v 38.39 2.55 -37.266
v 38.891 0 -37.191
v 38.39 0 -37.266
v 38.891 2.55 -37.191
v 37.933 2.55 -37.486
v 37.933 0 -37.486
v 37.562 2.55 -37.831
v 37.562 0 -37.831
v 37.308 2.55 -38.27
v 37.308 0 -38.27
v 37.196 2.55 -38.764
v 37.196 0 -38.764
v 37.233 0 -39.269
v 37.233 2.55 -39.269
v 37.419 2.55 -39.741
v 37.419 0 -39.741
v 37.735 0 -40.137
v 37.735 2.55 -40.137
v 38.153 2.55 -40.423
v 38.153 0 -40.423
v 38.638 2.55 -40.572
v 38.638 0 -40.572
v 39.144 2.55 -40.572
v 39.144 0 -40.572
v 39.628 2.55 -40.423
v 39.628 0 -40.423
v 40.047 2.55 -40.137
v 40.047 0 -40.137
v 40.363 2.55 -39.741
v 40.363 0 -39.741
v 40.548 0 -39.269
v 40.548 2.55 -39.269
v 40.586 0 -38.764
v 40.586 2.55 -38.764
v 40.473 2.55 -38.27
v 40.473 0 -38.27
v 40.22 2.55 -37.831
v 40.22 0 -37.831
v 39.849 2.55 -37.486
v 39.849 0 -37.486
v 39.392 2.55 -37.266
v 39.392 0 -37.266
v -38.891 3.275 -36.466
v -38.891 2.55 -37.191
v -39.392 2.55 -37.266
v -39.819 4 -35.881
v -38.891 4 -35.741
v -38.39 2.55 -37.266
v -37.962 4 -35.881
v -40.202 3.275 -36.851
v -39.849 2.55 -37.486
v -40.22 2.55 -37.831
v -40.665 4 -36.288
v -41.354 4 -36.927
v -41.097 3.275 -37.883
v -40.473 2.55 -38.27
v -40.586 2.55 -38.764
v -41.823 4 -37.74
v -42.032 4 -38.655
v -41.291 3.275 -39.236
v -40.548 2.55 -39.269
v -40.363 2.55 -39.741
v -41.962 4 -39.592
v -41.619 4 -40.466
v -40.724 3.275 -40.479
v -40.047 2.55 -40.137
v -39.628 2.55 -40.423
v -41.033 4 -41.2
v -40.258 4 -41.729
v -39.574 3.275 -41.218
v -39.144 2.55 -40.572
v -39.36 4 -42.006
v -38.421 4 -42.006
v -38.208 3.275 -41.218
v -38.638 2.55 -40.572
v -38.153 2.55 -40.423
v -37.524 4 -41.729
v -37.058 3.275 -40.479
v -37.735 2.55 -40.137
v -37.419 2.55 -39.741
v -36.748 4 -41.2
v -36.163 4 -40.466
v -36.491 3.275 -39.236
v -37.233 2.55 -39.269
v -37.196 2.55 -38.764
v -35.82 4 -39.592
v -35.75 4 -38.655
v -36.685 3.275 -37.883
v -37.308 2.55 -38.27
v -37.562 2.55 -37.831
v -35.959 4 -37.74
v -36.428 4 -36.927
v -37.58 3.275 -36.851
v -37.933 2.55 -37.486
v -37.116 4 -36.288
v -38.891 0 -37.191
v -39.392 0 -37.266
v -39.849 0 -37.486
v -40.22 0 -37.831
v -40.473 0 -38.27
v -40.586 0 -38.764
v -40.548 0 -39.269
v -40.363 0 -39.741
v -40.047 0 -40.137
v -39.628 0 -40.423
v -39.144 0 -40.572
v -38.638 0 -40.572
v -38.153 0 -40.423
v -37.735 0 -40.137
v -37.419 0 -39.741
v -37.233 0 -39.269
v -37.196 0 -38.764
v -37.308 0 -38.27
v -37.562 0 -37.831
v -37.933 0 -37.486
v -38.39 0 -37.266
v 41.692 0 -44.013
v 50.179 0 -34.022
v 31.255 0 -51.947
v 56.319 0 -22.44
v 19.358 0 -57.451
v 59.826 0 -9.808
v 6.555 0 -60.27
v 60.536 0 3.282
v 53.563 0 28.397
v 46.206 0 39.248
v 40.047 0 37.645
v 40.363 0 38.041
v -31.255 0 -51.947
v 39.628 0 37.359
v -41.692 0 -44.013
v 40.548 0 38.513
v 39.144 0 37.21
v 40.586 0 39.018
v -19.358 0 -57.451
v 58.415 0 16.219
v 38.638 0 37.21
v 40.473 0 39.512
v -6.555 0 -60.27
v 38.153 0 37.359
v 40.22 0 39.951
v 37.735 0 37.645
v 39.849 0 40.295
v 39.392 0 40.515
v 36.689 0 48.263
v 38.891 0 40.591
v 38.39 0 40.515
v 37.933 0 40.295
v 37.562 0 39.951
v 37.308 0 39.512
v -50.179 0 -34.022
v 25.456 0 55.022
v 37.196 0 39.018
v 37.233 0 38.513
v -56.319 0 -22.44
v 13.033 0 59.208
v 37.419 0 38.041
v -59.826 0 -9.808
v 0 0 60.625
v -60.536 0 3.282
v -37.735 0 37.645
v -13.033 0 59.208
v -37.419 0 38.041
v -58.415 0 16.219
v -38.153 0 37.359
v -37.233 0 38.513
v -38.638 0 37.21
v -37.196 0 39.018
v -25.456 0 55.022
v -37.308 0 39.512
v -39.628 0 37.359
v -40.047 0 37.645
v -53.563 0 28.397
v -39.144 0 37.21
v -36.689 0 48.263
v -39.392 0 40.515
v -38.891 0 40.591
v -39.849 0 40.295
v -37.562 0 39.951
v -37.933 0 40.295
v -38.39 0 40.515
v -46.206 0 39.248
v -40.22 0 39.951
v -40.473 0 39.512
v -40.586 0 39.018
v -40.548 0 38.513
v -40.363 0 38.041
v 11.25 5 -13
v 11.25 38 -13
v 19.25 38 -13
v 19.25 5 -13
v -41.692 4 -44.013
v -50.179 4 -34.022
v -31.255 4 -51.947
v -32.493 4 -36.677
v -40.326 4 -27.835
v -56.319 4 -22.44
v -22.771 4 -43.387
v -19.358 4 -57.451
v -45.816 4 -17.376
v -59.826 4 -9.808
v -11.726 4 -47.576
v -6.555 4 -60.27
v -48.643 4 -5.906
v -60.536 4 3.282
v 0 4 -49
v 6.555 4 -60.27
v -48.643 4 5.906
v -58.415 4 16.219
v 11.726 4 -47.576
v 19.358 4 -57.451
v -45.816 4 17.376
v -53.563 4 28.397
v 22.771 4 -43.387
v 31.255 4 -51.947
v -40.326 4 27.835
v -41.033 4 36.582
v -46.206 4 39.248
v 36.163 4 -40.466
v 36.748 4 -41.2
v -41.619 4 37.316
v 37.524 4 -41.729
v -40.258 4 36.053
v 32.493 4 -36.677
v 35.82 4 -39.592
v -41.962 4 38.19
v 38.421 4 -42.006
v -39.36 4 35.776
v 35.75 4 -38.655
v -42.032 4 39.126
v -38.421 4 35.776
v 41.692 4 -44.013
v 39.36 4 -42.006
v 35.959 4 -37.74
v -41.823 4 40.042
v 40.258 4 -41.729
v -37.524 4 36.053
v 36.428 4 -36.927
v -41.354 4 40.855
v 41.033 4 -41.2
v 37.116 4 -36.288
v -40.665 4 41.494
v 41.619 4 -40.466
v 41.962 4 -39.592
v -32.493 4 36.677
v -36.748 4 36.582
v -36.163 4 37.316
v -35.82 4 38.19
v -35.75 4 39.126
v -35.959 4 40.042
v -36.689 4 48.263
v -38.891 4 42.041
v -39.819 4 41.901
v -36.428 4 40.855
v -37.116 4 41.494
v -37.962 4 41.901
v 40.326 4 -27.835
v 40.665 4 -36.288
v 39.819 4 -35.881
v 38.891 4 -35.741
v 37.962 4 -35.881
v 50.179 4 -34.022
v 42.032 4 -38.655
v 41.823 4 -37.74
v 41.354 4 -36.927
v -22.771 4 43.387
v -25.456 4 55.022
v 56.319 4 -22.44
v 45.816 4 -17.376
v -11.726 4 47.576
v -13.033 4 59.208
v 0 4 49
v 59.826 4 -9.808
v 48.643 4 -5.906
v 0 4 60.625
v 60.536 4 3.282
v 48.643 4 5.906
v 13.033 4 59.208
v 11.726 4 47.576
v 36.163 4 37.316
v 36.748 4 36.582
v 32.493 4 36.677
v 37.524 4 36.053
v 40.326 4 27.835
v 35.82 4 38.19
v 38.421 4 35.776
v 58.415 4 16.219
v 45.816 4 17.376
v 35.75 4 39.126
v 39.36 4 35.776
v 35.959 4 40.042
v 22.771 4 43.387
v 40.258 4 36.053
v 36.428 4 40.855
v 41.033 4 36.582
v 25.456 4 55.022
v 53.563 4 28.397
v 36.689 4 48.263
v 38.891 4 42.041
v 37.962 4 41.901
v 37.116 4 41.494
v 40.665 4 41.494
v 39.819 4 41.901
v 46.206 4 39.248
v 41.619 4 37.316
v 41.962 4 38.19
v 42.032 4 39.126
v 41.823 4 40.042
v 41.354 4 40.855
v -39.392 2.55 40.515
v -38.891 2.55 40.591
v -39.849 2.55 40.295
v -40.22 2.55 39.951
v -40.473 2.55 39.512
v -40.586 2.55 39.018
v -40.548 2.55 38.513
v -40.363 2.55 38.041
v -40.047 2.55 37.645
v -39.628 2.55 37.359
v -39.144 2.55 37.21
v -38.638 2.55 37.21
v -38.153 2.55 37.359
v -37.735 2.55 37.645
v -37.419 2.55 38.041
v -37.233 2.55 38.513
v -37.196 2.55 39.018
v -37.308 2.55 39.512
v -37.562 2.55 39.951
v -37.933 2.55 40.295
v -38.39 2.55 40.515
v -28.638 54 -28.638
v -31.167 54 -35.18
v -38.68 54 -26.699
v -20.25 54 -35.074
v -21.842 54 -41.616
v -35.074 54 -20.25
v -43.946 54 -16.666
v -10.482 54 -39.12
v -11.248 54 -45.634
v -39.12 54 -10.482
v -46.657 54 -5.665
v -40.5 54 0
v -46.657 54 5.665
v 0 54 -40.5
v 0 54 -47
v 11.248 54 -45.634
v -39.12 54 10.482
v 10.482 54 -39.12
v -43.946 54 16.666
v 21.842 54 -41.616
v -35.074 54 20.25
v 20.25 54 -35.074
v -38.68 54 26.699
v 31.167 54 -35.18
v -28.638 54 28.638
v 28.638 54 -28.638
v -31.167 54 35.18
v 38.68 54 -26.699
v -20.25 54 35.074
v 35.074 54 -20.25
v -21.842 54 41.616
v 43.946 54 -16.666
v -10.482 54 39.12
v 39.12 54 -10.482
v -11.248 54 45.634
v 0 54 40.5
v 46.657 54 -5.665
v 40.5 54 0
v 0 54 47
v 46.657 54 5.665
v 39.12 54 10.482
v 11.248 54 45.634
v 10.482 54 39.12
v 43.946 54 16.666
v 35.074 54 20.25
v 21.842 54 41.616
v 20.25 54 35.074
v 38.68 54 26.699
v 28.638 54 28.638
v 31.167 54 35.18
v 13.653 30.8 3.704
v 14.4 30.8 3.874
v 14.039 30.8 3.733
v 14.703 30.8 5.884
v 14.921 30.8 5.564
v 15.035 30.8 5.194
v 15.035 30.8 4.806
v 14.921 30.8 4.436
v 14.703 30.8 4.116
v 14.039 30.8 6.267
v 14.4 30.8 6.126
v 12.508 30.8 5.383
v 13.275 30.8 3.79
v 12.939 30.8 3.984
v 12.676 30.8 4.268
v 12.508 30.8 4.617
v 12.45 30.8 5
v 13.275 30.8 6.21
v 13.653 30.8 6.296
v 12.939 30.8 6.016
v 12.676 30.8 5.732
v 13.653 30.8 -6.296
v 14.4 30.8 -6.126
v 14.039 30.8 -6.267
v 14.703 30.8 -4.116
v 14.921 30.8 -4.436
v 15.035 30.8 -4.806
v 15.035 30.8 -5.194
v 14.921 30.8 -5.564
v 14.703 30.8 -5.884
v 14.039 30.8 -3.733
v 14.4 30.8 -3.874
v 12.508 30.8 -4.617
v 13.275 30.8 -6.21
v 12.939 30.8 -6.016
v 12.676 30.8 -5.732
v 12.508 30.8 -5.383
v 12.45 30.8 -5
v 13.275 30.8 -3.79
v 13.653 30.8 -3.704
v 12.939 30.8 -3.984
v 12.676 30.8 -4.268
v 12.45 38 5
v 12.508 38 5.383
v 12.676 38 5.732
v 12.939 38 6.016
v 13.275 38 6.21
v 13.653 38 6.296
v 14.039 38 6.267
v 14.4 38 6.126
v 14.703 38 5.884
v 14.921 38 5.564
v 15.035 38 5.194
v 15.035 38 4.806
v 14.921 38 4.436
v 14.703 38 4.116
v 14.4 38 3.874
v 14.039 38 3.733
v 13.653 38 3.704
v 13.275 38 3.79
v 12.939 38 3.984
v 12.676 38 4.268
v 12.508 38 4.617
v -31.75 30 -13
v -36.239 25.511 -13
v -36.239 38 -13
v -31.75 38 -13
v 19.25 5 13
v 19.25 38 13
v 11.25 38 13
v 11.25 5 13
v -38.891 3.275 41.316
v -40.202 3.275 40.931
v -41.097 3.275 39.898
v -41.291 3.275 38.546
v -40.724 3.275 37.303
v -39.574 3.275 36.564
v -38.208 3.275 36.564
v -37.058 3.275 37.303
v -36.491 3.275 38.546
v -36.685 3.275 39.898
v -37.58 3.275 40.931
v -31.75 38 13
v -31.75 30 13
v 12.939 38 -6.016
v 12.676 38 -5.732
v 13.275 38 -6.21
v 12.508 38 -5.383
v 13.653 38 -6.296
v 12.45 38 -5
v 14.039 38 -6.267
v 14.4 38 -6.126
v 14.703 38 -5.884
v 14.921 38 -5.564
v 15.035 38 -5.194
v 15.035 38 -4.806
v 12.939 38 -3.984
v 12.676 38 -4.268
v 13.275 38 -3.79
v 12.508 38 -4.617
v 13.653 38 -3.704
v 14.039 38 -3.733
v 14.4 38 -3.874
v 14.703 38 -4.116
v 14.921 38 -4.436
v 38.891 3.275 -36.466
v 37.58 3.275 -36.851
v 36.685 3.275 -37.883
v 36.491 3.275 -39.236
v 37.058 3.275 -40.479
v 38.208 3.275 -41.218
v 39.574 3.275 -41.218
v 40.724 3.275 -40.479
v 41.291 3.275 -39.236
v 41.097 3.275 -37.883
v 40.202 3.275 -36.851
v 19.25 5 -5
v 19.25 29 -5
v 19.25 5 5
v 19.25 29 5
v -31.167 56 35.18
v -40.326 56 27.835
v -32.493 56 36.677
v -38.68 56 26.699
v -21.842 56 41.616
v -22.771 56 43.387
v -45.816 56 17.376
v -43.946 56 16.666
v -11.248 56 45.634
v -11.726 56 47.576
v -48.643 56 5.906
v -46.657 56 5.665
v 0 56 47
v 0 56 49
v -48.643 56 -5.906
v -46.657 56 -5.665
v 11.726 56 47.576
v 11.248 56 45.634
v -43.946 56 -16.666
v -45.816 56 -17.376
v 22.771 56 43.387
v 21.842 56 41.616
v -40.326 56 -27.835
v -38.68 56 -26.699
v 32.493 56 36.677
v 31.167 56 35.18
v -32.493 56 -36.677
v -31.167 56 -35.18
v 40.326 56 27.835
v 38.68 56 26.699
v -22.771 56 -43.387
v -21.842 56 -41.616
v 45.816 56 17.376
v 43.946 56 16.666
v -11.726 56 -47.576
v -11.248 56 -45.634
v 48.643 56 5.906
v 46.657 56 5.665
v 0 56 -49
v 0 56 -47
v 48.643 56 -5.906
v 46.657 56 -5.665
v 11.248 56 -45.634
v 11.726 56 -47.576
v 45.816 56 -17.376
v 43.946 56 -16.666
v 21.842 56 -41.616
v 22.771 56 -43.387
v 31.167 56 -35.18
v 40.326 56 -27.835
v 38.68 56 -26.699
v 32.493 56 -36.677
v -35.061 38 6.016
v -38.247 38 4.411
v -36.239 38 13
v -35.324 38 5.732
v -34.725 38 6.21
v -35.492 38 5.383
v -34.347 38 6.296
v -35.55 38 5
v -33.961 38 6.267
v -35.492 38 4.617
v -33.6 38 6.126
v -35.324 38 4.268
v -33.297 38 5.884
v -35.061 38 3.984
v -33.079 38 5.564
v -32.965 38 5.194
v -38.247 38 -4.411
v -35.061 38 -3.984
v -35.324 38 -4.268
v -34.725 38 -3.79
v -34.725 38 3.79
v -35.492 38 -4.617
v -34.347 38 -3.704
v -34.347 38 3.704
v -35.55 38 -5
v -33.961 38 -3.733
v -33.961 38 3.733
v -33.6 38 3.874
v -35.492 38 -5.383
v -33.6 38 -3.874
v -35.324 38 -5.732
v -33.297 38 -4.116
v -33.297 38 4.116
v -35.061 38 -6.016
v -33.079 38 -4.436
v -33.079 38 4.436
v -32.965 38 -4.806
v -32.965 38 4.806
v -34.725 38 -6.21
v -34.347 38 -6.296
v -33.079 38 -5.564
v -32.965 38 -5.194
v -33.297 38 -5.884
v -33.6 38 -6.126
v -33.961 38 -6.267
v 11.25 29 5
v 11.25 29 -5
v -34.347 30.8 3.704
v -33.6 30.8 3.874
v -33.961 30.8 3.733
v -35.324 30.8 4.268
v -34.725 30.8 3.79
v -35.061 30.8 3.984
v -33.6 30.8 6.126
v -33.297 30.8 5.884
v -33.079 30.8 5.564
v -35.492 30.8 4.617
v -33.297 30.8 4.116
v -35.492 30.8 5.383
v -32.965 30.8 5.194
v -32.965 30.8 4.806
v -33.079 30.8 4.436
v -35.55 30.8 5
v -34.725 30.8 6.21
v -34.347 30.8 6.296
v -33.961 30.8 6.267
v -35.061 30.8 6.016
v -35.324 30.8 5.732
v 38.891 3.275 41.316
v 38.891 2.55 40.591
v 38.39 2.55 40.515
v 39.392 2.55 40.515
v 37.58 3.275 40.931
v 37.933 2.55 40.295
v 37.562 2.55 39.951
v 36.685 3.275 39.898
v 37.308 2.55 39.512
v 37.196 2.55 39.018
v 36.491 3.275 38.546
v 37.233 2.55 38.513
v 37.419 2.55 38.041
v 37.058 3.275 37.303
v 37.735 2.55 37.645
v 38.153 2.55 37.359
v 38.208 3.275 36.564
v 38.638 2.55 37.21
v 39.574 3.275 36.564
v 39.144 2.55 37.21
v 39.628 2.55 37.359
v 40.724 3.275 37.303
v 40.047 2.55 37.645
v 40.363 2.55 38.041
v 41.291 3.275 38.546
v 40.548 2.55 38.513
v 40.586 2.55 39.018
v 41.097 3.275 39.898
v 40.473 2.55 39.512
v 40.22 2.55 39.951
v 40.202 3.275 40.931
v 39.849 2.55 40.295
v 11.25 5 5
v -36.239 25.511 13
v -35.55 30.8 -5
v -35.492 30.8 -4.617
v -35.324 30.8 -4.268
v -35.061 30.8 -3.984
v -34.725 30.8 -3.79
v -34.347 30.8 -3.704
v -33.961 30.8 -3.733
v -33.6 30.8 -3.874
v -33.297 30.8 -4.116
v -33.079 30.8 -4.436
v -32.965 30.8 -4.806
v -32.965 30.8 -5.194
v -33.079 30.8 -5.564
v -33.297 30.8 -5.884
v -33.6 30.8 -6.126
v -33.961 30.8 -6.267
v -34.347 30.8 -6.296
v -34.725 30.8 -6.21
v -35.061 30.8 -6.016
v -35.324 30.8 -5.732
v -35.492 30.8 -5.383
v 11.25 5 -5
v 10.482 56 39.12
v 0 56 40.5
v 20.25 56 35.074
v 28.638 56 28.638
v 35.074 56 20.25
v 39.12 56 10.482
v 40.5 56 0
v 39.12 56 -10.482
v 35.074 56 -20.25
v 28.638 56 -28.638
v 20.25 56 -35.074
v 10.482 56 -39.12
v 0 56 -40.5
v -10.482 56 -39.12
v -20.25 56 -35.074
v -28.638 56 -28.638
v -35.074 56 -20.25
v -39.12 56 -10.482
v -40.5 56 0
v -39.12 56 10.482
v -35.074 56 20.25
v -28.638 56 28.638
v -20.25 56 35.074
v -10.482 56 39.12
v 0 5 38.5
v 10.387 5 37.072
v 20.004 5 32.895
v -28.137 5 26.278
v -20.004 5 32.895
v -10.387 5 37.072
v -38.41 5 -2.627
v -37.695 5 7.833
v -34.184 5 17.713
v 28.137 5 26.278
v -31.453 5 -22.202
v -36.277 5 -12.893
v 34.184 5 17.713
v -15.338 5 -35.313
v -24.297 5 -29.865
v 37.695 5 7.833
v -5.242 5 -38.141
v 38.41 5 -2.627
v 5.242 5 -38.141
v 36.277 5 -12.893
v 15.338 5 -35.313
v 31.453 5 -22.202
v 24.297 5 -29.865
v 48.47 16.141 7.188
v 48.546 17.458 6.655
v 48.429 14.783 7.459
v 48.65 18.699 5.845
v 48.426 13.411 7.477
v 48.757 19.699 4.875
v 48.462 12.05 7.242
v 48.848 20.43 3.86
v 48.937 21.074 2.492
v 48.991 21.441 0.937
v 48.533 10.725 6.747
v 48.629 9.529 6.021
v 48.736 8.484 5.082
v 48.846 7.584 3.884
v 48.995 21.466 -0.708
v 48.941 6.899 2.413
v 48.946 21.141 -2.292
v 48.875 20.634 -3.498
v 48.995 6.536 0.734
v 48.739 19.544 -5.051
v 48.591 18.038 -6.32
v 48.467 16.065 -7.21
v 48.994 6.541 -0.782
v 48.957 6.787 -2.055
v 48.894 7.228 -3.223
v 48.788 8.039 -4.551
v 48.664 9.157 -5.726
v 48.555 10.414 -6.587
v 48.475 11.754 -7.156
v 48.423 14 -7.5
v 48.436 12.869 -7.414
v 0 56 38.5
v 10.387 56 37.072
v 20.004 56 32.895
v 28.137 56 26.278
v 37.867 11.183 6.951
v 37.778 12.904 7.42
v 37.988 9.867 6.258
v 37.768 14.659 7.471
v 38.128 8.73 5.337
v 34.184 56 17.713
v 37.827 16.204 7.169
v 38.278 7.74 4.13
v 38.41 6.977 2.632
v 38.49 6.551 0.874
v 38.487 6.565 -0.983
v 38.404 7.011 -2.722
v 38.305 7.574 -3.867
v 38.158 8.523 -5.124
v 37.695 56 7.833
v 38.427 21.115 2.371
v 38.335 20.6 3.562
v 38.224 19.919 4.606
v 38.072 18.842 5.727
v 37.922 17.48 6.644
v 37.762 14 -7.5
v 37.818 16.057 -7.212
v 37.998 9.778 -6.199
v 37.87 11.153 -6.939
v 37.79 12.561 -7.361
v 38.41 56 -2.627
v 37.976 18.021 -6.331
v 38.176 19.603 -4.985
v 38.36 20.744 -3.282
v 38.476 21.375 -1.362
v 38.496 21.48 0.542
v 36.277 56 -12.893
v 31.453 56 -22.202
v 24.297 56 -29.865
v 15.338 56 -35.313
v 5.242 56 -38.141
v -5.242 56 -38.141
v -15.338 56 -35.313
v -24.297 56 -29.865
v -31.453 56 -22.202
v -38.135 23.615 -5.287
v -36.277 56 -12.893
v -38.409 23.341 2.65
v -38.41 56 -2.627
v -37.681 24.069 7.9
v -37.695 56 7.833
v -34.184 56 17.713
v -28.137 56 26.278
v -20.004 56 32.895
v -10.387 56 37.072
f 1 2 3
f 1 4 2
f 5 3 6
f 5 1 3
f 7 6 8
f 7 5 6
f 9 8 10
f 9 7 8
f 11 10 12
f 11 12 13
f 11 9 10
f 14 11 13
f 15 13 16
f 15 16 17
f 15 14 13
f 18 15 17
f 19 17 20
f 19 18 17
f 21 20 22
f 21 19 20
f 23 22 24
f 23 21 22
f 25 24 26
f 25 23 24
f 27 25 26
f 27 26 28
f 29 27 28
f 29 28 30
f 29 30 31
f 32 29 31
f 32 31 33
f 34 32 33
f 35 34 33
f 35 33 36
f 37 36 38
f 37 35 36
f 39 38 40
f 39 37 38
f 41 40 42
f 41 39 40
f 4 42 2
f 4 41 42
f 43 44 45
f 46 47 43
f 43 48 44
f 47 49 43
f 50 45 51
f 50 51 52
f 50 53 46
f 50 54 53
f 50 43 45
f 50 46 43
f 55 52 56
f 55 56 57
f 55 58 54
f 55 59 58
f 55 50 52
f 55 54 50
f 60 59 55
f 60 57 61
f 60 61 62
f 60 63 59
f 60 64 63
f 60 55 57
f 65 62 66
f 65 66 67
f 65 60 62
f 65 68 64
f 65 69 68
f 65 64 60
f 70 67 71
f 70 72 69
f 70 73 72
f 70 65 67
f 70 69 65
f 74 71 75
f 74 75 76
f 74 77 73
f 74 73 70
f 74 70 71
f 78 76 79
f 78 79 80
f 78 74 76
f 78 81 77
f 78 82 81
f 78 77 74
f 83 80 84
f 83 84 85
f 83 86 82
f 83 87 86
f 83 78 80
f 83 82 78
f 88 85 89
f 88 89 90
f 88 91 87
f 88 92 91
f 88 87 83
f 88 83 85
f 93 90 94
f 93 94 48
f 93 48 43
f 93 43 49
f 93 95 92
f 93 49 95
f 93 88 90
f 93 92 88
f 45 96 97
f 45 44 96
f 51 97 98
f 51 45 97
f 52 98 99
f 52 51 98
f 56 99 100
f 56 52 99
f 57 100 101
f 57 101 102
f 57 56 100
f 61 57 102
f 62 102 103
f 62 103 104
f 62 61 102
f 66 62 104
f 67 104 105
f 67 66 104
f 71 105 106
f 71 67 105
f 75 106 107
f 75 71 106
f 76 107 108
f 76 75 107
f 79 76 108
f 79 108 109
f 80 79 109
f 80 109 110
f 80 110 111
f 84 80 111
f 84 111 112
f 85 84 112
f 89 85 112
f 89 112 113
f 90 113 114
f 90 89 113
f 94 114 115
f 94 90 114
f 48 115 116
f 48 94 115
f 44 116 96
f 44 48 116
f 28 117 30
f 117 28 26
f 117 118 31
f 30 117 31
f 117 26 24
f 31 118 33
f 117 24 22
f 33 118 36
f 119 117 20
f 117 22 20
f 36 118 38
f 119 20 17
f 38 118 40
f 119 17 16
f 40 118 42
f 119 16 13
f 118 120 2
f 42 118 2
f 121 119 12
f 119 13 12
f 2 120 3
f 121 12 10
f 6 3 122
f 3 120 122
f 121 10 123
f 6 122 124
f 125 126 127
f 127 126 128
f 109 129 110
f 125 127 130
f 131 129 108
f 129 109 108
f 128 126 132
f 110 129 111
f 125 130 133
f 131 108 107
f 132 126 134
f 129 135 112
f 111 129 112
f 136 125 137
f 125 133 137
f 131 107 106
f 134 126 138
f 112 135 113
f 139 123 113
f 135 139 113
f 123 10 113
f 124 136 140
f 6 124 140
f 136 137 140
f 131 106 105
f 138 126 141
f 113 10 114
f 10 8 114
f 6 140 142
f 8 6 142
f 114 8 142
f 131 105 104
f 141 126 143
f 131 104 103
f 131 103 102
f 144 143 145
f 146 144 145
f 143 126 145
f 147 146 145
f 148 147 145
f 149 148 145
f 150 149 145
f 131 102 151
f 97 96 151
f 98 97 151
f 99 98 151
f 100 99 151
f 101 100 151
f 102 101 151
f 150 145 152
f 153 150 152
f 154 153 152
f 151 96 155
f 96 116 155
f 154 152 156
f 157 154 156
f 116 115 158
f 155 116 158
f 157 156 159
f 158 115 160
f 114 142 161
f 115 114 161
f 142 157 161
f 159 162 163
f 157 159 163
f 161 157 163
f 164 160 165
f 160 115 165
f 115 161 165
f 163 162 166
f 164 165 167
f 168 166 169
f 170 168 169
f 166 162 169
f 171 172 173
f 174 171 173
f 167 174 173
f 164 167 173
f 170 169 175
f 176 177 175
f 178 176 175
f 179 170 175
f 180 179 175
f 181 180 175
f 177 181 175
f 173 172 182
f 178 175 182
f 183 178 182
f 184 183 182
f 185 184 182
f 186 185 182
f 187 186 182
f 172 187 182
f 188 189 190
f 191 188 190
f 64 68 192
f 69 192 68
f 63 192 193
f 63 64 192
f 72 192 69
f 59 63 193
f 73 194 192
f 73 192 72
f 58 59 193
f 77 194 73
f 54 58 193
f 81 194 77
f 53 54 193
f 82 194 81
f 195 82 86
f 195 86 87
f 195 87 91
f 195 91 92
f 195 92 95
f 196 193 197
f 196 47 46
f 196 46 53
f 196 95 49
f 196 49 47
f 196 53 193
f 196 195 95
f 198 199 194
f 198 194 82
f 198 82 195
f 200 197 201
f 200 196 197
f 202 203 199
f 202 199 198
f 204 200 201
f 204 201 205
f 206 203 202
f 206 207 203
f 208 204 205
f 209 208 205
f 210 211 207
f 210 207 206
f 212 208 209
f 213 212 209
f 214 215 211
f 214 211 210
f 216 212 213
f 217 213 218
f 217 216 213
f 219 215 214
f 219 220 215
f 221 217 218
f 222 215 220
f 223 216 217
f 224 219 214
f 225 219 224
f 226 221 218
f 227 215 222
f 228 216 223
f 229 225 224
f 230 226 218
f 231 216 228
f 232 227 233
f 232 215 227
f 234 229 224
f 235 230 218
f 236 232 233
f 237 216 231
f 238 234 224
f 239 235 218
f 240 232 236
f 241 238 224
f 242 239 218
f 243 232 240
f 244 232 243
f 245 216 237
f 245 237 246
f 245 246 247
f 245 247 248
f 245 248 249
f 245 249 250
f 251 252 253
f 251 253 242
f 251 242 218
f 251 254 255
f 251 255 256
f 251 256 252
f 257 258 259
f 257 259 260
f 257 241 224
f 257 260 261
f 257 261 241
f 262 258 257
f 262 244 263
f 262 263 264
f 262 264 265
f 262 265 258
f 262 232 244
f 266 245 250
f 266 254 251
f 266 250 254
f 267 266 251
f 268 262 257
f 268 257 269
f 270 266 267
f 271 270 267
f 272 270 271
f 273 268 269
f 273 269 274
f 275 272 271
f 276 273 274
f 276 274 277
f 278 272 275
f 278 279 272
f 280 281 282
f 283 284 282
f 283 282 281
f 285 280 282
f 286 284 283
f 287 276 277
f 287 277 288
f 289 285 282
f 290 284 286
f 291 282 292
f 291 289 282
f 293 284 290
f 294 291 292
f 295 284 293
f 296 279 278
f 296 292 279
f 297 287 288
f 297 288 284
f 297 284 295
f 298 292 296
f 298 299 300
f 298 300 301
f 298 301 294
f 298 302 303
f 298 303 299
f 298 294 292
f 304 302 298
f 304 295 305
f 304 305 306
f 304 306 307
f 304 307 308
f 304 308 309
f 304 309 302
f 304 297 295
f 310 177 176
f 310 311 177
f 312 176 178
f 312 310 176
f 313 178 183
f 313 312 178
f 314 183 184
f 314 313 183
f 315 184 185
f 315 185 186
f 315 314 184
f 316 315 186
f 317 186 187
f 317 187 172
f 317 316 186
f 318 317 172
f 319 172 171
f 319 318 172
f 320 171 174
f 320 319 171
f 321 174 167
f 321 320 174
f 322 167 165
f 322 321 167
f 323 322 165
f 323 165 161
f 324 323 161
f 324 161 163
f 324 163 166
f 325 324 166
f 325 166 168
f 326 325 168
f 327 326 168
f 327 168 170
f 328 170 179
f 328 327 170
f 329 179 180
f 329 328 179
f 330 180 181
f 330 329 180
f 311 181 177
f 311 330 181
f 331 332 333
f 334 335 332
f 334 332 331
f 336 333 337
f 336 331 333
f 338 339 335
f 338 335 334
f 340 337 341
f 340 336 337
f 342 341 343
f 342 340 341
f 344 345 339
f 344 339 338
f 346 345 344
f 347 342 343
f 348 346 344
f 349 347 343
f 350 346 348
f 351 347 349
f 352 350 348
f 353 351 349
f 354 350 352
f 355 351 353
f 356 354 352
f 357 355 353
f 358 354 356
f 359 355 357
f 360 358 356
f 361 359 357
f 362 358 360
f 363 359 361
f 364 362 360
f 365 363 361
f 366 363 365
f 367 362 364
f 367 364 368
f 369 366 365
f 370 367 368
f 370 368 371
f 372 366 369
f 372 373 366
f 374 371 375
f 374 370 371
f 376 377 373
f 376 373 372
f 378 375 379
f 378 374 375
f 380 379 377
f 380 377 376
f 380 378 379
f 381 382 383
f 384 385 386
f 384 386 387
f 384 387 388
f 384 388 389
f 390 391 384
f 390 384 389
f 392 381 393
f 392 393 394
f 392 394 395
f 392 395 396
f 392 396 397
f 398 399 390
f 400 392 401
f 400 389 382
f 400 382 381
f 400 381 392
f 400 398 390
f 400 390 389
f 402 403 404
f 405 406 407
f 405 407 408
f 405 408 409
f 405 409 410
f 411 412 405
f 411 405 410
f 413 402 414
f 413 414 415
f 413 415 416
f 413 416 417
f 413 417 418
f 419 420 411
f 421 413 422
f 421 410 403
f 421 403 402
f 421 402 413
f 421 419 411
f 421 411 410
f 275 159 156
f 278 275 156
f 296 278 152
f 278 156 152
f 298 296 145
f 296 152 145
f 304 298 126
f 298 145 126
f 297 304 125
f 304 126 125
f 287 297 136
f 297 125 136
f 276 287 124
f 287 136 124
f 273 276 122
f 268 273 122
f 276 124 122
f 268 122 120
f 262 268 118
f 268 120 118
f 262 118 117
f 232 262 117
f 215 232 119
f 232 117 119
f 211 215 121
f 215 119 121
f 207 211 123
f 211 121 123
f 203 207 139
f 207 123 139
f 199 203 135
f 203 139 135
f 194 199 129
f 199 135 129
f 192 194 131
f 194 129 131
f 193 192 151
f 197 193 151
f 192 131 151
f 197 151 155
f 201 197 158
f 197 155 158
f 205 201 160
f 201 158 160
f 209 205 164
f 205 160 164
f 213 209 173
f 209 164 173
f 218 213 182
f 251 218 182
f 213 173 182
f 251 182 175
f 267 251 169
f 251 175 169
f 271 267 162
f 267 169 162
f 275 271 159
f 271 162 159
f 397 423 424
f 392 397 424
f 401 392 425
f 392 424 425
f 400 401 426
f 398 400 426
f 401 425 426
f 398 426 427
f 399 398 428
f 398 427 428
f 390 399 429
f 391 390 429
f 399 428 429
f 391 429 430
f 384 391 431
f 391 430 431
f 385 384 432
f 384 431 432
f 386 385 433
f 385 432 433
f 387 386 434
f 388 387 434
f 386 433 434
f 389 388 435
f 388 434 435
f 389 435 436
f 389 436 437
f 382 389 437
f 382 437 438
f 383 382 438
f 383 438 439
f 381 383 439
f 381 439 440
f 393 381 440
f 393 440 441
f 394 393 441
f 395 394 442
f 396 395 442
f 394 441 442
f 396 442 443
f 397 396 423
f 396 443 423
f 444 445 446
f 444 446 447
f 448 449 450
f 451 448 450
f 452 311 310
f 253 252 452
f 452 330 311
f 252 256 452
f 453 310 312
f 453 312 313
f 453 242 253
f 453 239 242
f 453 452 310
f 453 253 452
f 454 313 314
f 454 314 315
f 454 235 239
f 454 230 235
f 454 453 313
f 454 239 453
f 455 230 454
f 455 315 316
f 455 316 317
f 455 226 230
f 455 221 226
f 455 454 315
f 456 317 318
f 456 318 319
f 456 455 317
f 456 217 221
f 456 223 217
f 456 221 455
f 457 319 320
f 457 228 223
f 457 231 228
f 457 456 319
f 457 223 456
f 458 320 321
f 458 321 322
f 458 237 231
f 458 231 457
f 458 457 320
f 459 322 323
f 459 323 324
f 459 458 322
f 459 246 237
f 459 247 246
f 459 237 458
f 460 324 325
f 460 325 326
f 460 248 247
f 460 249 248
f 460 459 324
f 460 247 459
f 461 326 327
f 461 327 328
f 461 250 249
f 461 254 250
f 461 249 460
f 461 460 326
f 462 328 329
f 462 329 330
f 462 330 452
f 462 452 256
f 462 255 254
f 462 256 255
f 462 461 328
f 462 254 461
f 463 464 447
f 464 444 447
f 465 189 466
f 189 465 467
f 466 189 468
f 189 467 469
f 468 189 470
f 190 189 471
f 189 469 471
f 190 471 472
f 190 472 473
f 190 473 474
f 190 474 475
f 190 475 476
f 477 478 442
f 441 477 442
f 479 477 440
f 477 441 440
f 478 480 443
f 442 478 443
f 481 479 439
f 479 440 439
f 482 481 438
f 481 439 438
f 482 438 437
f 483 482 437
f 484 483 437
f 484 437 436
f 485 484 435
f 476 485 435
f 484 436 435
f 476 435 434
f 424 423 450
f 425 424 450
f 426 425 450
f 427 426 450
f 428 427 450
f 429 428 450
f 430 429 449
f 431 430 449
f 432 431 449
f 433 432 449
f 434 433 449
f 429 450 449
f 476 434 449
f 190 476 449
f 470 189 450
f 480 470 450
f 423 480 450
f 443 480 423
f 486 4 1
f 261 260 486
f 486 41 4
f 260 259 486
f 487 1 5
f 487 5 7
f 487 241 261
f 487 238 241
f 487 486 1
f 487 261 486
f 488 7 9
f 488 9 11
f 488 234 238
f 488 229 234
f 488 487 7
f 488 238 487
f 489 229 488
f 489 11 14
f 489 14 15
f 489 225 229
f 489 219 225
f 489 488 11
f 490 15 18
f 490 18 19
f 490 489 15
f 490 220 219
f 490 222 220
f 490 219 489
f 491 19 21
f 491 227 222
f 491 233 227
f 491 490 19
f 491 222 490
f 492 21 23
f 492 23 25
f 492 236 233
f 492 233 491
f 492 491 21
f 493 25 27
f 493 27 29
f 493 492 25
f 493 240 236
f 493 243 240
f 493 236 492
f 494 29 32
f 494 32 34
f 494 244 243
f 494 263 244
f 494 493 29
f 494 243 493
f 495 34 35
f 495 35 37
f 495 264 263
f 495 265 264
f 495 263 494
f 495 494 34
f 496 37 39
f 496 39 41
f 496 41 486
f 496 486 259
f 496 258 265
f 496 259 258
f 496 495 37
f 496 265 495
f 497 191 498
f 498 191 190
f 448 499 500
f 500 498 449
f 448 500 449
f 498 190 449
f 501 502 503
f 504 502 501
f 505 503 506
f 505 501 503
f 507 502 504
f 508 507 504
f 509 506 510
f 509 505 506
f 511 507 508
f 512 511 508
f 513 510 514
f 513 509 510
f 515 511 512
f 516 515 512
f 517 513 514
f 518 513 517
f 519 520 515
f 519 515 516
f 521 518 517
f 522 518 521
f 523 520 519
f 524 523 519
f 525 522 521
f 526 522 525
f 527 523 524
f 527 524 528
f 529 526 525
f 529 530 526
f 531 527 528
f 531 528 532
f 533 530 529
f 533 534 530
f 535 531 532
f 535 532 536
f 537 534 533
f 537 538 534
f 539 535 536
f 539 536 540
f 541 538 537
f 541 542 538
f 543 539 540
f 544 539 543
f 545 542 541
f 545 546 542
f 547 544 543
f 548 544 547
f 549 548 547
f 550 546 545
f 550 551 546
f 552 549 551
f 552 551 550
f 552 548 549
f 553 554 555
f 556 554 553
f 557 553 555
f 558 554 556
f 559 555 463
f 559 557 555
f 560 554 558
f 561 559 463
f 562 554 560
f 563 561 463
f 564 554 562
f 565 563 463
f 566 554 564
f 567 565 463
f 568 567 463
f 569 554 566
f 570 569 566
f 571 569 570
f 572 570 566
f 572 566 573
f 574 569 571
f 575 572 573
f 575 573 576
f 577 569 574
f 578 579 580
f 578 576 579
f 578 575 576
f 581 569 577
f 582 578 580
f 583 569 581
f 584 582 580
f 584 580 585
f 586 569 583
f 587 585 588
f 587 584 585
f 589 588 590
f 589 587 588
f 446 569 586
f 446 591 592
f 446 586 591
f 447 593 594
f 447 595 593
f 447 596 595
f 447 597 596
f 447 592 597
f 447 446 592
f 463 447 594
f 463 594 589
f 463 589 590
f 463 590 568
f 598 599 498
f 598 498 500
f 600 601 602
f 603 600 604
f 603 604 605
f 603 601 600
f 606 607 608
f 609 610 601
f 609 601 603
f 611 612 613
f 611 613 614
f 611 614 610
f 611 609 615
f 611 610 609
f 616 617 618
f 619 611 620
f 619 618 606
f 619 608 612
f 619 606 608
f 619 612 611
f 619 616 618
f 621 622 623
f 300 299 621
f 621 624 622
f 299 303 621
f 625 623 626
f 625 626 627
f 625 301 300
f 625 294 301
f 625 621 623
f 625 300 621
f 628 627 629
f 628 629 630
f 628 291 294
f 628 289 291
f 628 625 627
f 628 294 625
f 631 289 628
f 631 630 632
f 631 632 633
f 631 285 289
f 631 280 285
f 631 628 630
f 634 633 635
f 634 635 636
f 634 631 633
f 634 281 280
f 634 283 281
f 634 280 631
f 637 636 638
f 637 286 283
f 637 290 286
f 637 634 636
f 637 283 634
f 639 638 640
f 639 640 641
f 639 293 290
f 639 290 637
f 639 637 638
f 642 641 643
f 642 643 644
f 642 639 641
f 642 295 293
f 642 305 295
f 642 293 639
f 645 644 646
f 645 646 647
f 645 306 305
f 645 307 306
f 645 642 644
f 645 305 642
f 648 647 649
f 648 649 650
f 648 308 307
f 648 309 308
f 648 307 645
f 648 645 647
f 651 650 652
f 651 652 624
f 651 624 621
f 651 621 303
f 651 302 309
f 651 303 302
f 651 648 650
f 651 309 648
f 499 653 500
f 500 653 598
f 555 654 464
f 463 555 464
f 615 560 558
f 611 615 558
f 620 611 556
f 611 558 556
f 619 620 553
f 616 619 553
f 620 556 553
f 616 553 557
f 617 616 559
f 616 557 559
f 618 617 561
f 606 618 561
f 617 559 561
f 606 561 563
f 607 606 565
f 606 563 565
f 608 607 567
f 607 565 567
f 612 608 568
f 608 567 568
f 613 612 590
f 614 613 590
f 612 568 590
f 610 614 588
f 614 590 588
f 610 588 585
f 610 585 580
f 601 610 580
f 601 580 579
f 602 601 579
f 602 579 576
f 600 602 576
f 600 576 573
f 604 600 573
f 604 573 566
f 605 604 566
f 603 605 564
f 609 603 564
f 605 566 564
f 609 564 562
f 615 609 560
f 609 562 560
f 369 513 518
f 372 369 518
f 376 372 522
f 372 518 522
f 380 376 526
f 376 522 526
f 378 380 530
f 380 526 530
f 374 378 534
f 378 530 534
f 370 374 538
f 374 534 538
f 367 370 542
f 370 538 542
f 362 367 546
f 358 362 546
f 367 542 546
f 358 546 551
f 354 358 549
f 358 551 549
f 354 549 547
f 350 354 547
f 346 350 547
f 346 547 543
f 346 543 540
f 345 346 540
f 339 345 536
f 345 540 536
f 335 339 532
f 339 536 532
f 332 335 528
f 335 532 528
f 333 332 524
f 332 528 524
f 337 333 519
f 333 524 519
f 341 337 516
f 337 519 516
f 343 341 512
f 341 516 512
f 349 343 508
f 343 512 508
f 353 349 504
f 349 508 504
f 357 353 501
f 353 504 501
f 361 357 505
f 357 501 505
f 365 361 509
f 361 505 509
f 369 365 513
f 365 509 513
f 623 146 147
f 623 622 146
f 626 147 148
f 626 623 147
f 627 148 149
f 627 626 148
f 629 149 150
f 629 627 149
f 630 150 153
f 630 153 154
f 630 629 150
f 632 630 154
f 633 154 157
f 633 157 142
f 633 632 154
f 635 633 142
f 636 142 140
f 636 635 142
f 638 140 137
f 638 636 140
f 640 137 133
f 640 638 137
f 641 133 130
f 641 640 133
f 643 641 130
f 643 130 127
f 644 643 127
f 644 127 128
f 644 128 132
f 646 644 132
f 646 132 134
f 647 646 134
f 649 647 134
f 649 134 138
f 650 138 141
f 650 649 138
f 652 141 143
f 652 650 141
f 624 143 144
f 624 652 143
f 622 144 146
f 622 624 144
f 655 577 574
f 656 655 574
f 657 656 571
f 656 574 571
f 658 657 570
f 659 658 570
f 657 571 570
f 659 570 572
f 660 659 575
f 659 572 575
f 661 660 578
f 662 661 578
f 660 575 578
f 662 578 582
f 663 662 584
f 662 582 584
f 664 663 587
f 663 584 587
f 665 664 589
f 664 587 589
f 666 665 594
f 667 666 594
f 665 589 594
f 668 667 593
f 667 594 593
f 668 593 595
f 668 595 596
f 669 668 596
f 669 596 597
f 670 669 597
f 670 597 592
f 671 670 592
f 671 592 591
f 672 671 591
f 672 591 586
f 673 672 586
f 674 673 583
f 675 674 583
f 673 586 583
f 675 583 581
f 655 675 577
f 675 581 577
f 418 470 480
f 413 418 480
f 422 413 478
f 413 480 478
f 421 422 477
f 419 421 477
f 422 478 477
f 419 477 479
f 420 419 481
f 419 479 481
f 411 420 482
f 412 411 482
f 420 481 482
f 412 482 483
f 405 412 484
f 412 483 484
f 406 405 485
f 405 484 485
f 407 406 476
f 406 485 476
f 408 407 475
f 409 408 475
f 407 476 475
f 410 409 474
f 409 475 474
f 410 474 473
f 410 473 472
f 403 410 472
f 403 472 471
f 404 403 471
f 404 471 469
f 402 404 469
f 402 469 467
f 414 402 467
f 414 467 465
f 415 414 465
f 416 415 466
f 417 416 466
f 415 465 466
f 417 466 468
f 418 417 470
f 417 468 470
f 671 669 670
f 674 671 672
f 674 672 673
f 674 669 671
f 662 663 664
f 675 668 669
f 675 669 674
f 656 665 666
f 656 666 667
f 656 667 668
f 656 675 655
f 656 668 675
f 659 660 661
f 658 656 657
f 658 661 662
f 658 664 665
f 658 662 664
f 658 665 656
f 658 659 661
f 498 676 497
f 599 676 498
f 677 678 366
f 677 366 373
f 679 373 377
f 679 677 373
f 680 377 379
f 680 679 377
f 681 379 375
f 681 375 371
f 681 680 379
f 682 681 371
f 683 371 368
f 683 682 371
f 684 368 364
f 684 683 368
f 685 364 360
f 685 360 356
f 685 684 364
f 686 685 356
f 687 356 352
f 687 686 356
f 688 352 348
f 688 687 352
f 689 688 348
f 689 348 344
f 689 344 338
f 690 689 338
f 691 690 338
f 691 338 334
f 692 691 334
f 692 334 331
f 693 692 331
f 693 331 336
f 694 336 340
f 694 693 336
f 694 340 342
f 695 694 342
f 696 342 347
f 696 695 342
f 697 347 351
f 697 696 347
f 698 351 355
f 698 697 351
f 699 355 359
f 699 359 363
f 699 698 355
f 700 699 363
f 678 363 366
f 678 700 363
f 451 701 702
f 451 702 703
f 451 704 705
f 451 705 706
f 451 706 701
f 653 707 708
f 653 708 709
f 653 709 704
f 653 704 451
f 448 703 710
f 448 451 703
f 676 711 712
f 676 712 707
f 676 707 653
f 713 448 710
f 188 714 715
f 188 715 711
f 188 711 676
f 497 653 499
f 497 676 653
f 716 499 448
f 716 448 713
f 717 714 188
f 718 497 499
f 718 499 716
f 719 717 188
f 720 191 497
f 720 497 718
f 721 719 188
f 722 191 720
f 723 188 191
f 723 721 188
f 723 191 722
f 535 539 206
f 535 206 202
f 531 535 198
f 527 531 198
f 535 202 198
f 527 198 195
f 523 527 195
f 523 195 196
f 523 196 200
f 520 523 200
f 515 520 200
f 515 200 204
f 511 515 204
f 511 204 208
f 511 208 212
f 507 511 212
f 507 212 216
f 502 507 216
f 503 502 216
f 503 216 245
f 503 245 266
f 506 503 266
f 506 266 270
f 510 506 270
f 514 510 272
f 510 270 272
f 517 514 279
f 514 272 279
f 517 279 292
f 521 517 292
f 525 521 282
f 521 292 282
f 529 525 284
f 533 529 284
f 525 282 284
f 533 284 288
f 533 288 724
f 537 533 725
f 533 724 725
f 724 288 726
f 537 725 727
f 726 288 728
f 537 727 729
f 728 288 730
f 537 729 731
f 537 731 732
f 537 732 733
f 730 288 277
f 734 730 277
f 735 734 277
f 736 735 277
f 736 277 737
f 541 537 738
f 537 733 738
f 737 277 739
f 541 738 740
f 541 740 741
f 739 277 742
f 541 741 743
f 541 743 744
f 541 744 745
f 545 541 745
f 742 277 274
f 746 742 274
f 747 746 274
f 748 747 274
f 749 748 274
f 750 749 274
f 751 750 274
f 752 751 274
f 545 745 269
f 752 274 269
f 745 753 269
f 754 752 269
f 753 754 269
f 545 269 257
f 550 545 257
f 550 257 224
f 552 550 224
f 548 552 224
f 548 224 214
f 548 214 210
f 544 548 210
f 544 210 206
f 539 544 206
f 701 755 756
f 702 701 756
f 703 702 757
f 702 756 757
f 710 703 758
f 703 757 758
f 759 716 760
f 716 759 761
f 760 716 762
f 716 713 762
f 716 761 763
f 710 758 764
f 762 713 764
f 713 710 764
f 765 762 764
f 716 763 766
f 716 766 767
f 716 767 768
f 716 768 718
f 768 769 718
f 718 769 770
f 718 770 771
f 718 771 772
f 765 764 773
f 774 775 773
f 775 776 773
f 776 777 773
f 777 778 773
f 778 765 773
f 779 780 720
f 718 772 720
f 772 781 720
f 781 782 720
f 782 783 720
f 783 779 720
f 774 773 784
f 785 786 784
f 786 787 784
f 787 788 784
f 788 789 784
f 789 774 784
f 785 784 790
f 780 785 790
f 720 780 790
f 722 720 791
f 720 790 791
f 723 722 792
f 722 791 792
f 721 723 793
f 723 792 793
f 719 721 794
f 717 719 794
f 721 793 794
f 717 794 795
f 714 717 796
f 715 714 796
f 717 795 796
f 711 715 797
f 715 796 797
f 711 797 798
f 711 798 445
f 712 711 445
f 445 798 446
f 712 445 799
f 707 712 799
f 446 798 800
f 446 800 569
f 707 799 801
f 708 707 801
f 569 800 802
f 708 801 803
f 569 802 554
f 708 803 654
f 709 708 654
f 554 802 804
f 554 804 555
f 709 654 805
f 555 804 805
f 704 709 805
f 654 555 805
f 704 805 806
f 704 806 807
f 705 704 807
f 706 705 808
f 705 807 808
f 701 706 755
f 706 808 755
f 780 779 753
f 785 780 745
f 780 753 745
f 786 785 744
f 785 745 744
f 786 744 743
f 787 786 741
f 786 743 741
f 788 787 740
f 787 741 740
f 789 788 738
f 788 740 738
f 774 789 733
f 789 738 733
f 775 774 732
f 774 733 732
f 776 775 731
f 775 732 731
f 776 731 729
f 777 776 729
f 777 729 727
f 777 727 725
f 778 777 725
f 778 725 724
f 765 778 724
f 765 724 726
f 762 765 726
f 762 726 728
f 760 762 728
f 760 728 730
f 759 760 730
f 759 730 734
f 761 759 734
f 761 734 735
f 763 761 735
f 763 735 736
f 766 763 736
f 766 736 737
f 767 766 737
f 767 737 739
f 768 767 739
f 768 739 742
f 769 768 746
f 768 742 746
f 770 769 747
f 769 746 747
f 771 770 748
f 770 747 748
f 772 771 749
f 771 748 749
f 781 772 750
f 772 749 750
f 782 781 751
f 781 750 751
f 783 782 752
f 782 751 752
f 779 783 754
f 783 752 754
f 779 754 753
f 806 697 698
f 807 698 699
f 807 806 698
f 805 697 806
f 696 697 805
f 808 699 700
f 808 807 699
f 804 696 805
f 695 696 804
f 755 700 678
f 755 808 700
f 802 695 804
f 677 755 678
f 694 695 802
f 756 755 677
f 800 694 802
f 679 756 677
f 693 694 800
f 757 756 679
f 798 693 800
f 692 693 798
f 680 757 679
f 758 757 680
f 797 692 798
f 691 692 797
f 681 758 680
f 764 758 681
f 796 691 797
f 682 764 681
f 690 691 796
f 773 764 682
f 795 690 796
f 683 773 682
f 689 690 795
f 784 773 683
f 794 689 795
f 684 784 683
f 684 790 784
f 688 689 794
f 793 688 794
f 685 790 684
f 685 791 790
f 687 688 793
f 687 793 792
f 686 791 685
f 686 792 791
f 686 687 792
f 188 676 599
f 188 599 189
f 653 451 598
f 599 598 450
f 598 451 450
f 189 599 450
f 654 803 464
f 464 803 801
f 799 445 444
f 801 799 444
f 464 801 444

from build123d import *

# Parameters (mm, degrees)
SKETCH1_R                                    = 60.625
SKETCH1_R_2                                  = 45
BOSS_EXTRUDE1_DEPTH                          = 4
SKETCH2_R                                    = 49
SKETCH2_R_2                                  = 45
BOSS_EXTRUDE2_DEPTH                          = 52
SKETCH4_W                                    = 13.25
SKETCH4_H                                    = 8
SKETCH4_W_2                                  = 8
SKETCH4_H_2                                  = 38
BOSS_EXTRUDE4_DEPTH                          = 13
BOSS_EXTRUDE5_DEPTH                          = 4
BOSS_EXTRUDE6_REACH                          = 104.405
SKETCH18_R                                   = 45.113728165
SKETCH18_R_2                                 = 38.5
SKETCH7_R                                    = 1.3
CUT_EXTRUDE4_DEPTH                           = 7.2
SKETCH9_W                                    = 10
SKETCH9_H                                    = 24
CUT_EXTRUDE7_DEPTH                           = 8
SKETCH11_R                                   = 7.5
CUT_EXTRUDE8_DEPTH                           = 20
CUT_EXTRUDE9_DEPTH                           = 101.273532203
CSK_FOR_M3_COUNTERSUNK_FLAT_HEAD_SCR_2_COUNT = 2
CSK_FOR_M3_COUNTERSUNK_FLAT_HEAD_SCR_2_PITCH = 77.781745931
CSK_FOR_M3_COUNTERSUNK_FLAT_HEAD_SCR_3_COUNT = 2
CSK_FOR_M3_COUNTERSUNK_FLAT_HEAD_SCR_3_PITCH = 110
CSK_FOR_M3_COUNTERSUNK_FLAT_HEAD_SCR_4_COUNT = 2
CSK_FOR_M3_COUNTERSUNK_FLAT_HEAD_SCR_4_PITCH = 77.781745931
SKETCH20_R                                   = 38.708370422
BOSS_EXTRUDE7_DEPTH                          = 5
SKETCH21_R                                   = 47
SKETCH21_R_2                                 = 40.5
CUT_EXTRUDE10_DEPTH                          = 2


with BuildPart() as part:
    # Sketch1 → Boss-Extrude1 (new body)
    with BuildSketch(Plane(origin=(0, 0, 0), x_dir=(1, 0, 0), z_dir=(0, 1, 0))):
        with Locations(Location((0, 0, 0), (0, 0, 270))):
            Circle(SKETCH1_R)
        with Locations(Location((0, 0, 0), (0, 0, 270))):
            Circle(SKETCH1_R_2, mode=Mode.SUBTRACT)
    extrude(amount=BOSS_EXTRUDE1_DEPTH)

    # Sketch2 → Boss-Extrude2 (add)
    with BuildSketch(Plane(origin=(0, 4, 0), x_dir=(1, 0, 0), z_dir=(0, 1, 0))):
        with Locations(Location((0, 0, 0), (0, 0, 90))):
            Circle(SKETCH2_R)
        with Locations(Location((0, 0, 0), (0, 0, 270))):
            Circle(SKETCH2_R_2, mode=Mode.SUBTRACT)
    extrude(amount=BOSS_EXTRUDE2_DEPTH)

    # Sketch4 → Boss-Extrude4 (add, symmetric)
    with BuildSketch(Plane.XY):
        with Locations((-38.375, 34)):
            Rectangle(SKETCH4_W, SKETCH4_H)
        Polygon((-31.75, 30), (-45, 30), (-45, 16.75), align=None)
        with Locations((15.25, 19)):
            Rectangle(SKETCH4_W_2, SKETCH4_H_2)
    extrude(amount=BOSS_EXTRUDE4_DEPTH, both=True)


with BuildPart() as boss_extrude4_piece_1:
    # of the separate pieces the step leaves, piece 1, a body of its own (boss_extrude4_pieces)
    add(part.part.solids().sort_by_distance((0, 0, 60.625))[0])



with BuildPart() as boss_extrude4_piece_2:
    # of the separate pieces the step leaves, piece 2, a body of its own (boss_extrude4_pieces)
    add(part.part.solids().sort_by_distance((11.25, 38, -13))[0])


with BuildPart() as boss_extrude4_piece_1_1:
    add(boss_extrude4_piece_1.part)

    add(boss_extrude4_piece_2.part)  # Boss-Extrude5 merges Boss-Extrude4 piece 2
    # Sketch5 → Boss-Extrude5 (add)
    with BuildSketch(Plane.XZ):
        with BuildLine():
            Line((11.25, 13), (29.067400866, 34.352382842))
            ThreePointArc((29.067400866, 34.352382842), (45, 0), (29.067400866, -34.352382842))
            Line((29.067400866, -34.352382842), (11.25, -13))
            Line((11.25, -13), (11.25, 13))
        make_face()
    extrude(amount=-BOSS_EXTRUDE5_DEPTH)

    # Boss-Extrude6: up to this face of the body (flat: up to its plane)
    boss_extrude6_end = Plane(boss_extrude4_piece_1_1.part.faces().sort_by_distance((12.964733944, 0, 0))[0])
    # Sketch18 → Boss-Extrude6 (add, up to the picked face)
    with BuildSketch(Plane(origin=(0, 56, 0), x_dir=(1, 0, 0), z_dir=(0, 1, 0)), mode=Mode.PRIVATE) as boss_extrude6_sk1:
        Circle(SKETCH18_R)
        with Locations(Location((0, 0, 0), (0, 0, 270))):
            Circle(SKETCH18_R_2, mode=Mode.SUBTRACT)
    boss_extrude6_tool1 = split(extrude(boss_extrude6_sk1.sketch, amount=-BOSS_EXTRUDE6_REACH, mode=Mode.PRIVATE), bisect_by=boss_extrude6_end, keep=Keep.BOTH, mode=Mode.PRIVATE)
    add(boss_extrude6_tool1.solids().sort_by(Axis((-43.837719, 56, 0), (0, -1, 0)))[0])

    # Sketch7 → Cut-Extrude4 (cut)
    with BuildSketch(Plane(origin=(0, 38, 0), x_dir=(1, 0, 0), z_dir=(0, 1, 0))):
        with Locations(Location((-34.25, 5, 0), (0, 0, 180))):
            Circle(SKETCH7_R)
        with Locations(Location((-34.25, -5, 0), (0, 0, 180))):
            Circle(SKETCH7_R)
        with Locations(Location((13.75, 5, 0), (0, 0, 180))):
            Circle(SKETCH7_R)
        with Locations(Location((13.75, -5, 0), (0, 0, 180))):
            Circle(SKETCH7_R)
    extrude(amount=-CUT_EXTRUDE4_DEPTH, mode=Mode.SUBTRACT)

    # Sketch9 → Cut-Extrude7 (cut)
    with BuildSketch(Plane.ZY.offset(-11.25)):
        with Locations((0, 17)):
            Rectangle(SKETCH9_W, SKETCH9_H)
    extrude(amount=-CUT_EXTRUDE7_DEPTH, mode=Mode.SUBTRACT)

    # Sketch11 → Cut-Extrude8 (cut)
    with BuildSketch(Plane(origin=(49, 0, 0), x_dir=(0, 0, -1), z_dir=(1, 0, 0))):
        with Locations((0, 14)):
            Circle(SKETCH11_R)
    extrude(amount=-CUT_EXTRUDE8_DEPTH, mode=Mode.SUBTRACT)

    # Sketch12 → Cut-Extrude9 (cut, through all)
    # profile 1 of 2: a face of its own
    with BuildSketch(Plane(origin=(0, 4, 0), x_dir=(1, 0, 0), z_dir=(0, 1, 0))):
        with BuildLine():
            Line((19.25, -13), (11.25, -13))
            Line((11.25, -13), (24.902812686, -29.361538112))
            ThreePointArc((24.902812686, -29.361538112), (38.5, 0), (24.902812686, 29.361538112))
            Line((24.902812686, 29.361538112), (11.25, 13))
            Line((11.25, 13), (19.25, 13))
            Line((19.25, 13), (19.25, -13))
        make_face()
        with BuildLine():
            Line((27.25, -13.699908759), (27.25, 13.699908759))
            ThreePointArc((27.25, 13.699908759), (30.5, 0), (27.25, -13.699908759))
        make_face(mode=Mode.SUBTRACT)
    # profile 2 of 2: a face of its own
    with BuildSketch(Plane(origin=(0, 4, 0), x_dir=(1, 0, 0), z_dir=(0, 1, 0))):
        with BuildLine():
            ThreePointArc((27.25, -13.699908759), (30.5, 0), (27.25, 13.699908759))
            Line((27.25, 13.699908759), (27.25, -13.699908759))
        make_face()
    extrude(amount=-CUT_EXTRUDE9_DEPTH, mode=Mode.SUBTRACT)


with BuildPart() as cut_extrude9_piece_1:
    # of the separate pieces the step leaves, piece 1, a body of its own (cut_extrude9_pieces)
    add(boss_extrude4_piece_1_1.part.solids().sort_by_distance((0, 0, 38.5))[0])

    # Sketch17 → CSK for M3 Countersunk Flat Head Screw1 (revolve, cut)
    with BuildSketch(Plane(origin=(-38.890872965, 4, -38.890872965), x_dir=(0, 0, 1), z_dir=(1, 0, 0))):
        Polygon((0, 0), (0, 4), (1.7, 4), (1.7, 1.45), (3.15, 0), align=None)
    csk_for_m3_countersunk_flat_head_screw1 = revolve(axis=Axis((-38.890872965, 10.35, -38.890872965), (0, -1, 0)), mode=Mode.SUBTRACT)

    # CSK for M3 Countersunk Flat Head Scr 2: CSK for M3 Countersunk Flat Head Screw1 ×2
    with Locations(*[(0, 0, i * CSK_FOR_M3_COUNTERSUNK_FLAT_HEAD_SCR_2_PITCH) for i in range(1, CSK_FOR_M3_COUNTERSUNK_FLAT_HEAD_SCR_2_COUNT)]):
        add(csk_for_m3_countersunk_flat_head_screw1, mode=Mode.SUBTRACT)

    # CSK for M3 Countersunk Flat Head Scr 3: CSK for M3 Countersunk Flat Head Screw1 ×2
    with Locations(*[Vector(0.7071067811865713, 0, 0.7071067811865237) * (i * CSK_FOR_M3_COUNTERSUNK_FLAT_HEAD_SCR_3_PITCH) for i in range(1, CSK_FOR_M3_COUNTERSUNK_FLAT_HEAD_SCR_3_COUNT)]):
        add(csk_for_m3_countersunk_flat_head_screw1, mode=Mode.SUBTRACT)

    # CSK for M3 Countersunk Flat Head Scr 4: CSK for M3 Countersunk Flat Head Screw1 ×2
    with Locations(*[(i * CSK_FOR_M3_COUNTERSUNK_FLAT_HEAD_SCR_4_PITCH, 0, 0) for i in range(1, CSK_FOR_M3_COUNTERSUNK_FLAT_HEAD_SCR_4_COUNT)]):
        add(csk_for_m3_countersunk_flat_head_screw1, mode=Mode.SUBTRACT)



with BuildPart() as cut_extrude9_piece_2:
    # of the separate pieces the step leaves, piece 2, a body of its own (cut_extrude9_pieces)
    add(boss_extrude4_piece_1_1.part.solids().sort_by_distance((11.25, 38, -13))[0])


with BuildPart() as cut_extrude9_piece_1_1:
    add(cut_extrude9_piece_1.part)

    add(cut_extrude9_piece_2.part)  # Boss-Extrude7 merges Cut-Extrude9 piece 2
    # Sketch20 → Boss-Extrude7 (add)
    with BuildSketch(Plane(origin=(0, 5, 0), x_dir=(1, 0, 0), z_dir=(0, 1, 0))):
        Circle(SKETCH20_R)
    extrude(amount=-BOSS_EXTRUDE7_DEPTH)

    # Sketch21 → Cut-Extrude10 (cut)
    with BuildSketch(Plane(origin=(0, 56, 0), x_dir=(1, 0, 0), z_dir=(0, 1, 0))):
        with Locations(Location((0, 0, 0), (0, 0, 270))):
            Circle(SKETCH21_R)
        with Locations(Location((0, 0, 0), (0, 0, 270))):
            Circle(SKETCH21_R_2, mode=Mode.SUBTRACT)
    extrude(amount=-CUT_EXTRUDE10_DEPTH, mode=Mode.SUBTRACT)


solid = cut_extrude9_piece_1_1.part
